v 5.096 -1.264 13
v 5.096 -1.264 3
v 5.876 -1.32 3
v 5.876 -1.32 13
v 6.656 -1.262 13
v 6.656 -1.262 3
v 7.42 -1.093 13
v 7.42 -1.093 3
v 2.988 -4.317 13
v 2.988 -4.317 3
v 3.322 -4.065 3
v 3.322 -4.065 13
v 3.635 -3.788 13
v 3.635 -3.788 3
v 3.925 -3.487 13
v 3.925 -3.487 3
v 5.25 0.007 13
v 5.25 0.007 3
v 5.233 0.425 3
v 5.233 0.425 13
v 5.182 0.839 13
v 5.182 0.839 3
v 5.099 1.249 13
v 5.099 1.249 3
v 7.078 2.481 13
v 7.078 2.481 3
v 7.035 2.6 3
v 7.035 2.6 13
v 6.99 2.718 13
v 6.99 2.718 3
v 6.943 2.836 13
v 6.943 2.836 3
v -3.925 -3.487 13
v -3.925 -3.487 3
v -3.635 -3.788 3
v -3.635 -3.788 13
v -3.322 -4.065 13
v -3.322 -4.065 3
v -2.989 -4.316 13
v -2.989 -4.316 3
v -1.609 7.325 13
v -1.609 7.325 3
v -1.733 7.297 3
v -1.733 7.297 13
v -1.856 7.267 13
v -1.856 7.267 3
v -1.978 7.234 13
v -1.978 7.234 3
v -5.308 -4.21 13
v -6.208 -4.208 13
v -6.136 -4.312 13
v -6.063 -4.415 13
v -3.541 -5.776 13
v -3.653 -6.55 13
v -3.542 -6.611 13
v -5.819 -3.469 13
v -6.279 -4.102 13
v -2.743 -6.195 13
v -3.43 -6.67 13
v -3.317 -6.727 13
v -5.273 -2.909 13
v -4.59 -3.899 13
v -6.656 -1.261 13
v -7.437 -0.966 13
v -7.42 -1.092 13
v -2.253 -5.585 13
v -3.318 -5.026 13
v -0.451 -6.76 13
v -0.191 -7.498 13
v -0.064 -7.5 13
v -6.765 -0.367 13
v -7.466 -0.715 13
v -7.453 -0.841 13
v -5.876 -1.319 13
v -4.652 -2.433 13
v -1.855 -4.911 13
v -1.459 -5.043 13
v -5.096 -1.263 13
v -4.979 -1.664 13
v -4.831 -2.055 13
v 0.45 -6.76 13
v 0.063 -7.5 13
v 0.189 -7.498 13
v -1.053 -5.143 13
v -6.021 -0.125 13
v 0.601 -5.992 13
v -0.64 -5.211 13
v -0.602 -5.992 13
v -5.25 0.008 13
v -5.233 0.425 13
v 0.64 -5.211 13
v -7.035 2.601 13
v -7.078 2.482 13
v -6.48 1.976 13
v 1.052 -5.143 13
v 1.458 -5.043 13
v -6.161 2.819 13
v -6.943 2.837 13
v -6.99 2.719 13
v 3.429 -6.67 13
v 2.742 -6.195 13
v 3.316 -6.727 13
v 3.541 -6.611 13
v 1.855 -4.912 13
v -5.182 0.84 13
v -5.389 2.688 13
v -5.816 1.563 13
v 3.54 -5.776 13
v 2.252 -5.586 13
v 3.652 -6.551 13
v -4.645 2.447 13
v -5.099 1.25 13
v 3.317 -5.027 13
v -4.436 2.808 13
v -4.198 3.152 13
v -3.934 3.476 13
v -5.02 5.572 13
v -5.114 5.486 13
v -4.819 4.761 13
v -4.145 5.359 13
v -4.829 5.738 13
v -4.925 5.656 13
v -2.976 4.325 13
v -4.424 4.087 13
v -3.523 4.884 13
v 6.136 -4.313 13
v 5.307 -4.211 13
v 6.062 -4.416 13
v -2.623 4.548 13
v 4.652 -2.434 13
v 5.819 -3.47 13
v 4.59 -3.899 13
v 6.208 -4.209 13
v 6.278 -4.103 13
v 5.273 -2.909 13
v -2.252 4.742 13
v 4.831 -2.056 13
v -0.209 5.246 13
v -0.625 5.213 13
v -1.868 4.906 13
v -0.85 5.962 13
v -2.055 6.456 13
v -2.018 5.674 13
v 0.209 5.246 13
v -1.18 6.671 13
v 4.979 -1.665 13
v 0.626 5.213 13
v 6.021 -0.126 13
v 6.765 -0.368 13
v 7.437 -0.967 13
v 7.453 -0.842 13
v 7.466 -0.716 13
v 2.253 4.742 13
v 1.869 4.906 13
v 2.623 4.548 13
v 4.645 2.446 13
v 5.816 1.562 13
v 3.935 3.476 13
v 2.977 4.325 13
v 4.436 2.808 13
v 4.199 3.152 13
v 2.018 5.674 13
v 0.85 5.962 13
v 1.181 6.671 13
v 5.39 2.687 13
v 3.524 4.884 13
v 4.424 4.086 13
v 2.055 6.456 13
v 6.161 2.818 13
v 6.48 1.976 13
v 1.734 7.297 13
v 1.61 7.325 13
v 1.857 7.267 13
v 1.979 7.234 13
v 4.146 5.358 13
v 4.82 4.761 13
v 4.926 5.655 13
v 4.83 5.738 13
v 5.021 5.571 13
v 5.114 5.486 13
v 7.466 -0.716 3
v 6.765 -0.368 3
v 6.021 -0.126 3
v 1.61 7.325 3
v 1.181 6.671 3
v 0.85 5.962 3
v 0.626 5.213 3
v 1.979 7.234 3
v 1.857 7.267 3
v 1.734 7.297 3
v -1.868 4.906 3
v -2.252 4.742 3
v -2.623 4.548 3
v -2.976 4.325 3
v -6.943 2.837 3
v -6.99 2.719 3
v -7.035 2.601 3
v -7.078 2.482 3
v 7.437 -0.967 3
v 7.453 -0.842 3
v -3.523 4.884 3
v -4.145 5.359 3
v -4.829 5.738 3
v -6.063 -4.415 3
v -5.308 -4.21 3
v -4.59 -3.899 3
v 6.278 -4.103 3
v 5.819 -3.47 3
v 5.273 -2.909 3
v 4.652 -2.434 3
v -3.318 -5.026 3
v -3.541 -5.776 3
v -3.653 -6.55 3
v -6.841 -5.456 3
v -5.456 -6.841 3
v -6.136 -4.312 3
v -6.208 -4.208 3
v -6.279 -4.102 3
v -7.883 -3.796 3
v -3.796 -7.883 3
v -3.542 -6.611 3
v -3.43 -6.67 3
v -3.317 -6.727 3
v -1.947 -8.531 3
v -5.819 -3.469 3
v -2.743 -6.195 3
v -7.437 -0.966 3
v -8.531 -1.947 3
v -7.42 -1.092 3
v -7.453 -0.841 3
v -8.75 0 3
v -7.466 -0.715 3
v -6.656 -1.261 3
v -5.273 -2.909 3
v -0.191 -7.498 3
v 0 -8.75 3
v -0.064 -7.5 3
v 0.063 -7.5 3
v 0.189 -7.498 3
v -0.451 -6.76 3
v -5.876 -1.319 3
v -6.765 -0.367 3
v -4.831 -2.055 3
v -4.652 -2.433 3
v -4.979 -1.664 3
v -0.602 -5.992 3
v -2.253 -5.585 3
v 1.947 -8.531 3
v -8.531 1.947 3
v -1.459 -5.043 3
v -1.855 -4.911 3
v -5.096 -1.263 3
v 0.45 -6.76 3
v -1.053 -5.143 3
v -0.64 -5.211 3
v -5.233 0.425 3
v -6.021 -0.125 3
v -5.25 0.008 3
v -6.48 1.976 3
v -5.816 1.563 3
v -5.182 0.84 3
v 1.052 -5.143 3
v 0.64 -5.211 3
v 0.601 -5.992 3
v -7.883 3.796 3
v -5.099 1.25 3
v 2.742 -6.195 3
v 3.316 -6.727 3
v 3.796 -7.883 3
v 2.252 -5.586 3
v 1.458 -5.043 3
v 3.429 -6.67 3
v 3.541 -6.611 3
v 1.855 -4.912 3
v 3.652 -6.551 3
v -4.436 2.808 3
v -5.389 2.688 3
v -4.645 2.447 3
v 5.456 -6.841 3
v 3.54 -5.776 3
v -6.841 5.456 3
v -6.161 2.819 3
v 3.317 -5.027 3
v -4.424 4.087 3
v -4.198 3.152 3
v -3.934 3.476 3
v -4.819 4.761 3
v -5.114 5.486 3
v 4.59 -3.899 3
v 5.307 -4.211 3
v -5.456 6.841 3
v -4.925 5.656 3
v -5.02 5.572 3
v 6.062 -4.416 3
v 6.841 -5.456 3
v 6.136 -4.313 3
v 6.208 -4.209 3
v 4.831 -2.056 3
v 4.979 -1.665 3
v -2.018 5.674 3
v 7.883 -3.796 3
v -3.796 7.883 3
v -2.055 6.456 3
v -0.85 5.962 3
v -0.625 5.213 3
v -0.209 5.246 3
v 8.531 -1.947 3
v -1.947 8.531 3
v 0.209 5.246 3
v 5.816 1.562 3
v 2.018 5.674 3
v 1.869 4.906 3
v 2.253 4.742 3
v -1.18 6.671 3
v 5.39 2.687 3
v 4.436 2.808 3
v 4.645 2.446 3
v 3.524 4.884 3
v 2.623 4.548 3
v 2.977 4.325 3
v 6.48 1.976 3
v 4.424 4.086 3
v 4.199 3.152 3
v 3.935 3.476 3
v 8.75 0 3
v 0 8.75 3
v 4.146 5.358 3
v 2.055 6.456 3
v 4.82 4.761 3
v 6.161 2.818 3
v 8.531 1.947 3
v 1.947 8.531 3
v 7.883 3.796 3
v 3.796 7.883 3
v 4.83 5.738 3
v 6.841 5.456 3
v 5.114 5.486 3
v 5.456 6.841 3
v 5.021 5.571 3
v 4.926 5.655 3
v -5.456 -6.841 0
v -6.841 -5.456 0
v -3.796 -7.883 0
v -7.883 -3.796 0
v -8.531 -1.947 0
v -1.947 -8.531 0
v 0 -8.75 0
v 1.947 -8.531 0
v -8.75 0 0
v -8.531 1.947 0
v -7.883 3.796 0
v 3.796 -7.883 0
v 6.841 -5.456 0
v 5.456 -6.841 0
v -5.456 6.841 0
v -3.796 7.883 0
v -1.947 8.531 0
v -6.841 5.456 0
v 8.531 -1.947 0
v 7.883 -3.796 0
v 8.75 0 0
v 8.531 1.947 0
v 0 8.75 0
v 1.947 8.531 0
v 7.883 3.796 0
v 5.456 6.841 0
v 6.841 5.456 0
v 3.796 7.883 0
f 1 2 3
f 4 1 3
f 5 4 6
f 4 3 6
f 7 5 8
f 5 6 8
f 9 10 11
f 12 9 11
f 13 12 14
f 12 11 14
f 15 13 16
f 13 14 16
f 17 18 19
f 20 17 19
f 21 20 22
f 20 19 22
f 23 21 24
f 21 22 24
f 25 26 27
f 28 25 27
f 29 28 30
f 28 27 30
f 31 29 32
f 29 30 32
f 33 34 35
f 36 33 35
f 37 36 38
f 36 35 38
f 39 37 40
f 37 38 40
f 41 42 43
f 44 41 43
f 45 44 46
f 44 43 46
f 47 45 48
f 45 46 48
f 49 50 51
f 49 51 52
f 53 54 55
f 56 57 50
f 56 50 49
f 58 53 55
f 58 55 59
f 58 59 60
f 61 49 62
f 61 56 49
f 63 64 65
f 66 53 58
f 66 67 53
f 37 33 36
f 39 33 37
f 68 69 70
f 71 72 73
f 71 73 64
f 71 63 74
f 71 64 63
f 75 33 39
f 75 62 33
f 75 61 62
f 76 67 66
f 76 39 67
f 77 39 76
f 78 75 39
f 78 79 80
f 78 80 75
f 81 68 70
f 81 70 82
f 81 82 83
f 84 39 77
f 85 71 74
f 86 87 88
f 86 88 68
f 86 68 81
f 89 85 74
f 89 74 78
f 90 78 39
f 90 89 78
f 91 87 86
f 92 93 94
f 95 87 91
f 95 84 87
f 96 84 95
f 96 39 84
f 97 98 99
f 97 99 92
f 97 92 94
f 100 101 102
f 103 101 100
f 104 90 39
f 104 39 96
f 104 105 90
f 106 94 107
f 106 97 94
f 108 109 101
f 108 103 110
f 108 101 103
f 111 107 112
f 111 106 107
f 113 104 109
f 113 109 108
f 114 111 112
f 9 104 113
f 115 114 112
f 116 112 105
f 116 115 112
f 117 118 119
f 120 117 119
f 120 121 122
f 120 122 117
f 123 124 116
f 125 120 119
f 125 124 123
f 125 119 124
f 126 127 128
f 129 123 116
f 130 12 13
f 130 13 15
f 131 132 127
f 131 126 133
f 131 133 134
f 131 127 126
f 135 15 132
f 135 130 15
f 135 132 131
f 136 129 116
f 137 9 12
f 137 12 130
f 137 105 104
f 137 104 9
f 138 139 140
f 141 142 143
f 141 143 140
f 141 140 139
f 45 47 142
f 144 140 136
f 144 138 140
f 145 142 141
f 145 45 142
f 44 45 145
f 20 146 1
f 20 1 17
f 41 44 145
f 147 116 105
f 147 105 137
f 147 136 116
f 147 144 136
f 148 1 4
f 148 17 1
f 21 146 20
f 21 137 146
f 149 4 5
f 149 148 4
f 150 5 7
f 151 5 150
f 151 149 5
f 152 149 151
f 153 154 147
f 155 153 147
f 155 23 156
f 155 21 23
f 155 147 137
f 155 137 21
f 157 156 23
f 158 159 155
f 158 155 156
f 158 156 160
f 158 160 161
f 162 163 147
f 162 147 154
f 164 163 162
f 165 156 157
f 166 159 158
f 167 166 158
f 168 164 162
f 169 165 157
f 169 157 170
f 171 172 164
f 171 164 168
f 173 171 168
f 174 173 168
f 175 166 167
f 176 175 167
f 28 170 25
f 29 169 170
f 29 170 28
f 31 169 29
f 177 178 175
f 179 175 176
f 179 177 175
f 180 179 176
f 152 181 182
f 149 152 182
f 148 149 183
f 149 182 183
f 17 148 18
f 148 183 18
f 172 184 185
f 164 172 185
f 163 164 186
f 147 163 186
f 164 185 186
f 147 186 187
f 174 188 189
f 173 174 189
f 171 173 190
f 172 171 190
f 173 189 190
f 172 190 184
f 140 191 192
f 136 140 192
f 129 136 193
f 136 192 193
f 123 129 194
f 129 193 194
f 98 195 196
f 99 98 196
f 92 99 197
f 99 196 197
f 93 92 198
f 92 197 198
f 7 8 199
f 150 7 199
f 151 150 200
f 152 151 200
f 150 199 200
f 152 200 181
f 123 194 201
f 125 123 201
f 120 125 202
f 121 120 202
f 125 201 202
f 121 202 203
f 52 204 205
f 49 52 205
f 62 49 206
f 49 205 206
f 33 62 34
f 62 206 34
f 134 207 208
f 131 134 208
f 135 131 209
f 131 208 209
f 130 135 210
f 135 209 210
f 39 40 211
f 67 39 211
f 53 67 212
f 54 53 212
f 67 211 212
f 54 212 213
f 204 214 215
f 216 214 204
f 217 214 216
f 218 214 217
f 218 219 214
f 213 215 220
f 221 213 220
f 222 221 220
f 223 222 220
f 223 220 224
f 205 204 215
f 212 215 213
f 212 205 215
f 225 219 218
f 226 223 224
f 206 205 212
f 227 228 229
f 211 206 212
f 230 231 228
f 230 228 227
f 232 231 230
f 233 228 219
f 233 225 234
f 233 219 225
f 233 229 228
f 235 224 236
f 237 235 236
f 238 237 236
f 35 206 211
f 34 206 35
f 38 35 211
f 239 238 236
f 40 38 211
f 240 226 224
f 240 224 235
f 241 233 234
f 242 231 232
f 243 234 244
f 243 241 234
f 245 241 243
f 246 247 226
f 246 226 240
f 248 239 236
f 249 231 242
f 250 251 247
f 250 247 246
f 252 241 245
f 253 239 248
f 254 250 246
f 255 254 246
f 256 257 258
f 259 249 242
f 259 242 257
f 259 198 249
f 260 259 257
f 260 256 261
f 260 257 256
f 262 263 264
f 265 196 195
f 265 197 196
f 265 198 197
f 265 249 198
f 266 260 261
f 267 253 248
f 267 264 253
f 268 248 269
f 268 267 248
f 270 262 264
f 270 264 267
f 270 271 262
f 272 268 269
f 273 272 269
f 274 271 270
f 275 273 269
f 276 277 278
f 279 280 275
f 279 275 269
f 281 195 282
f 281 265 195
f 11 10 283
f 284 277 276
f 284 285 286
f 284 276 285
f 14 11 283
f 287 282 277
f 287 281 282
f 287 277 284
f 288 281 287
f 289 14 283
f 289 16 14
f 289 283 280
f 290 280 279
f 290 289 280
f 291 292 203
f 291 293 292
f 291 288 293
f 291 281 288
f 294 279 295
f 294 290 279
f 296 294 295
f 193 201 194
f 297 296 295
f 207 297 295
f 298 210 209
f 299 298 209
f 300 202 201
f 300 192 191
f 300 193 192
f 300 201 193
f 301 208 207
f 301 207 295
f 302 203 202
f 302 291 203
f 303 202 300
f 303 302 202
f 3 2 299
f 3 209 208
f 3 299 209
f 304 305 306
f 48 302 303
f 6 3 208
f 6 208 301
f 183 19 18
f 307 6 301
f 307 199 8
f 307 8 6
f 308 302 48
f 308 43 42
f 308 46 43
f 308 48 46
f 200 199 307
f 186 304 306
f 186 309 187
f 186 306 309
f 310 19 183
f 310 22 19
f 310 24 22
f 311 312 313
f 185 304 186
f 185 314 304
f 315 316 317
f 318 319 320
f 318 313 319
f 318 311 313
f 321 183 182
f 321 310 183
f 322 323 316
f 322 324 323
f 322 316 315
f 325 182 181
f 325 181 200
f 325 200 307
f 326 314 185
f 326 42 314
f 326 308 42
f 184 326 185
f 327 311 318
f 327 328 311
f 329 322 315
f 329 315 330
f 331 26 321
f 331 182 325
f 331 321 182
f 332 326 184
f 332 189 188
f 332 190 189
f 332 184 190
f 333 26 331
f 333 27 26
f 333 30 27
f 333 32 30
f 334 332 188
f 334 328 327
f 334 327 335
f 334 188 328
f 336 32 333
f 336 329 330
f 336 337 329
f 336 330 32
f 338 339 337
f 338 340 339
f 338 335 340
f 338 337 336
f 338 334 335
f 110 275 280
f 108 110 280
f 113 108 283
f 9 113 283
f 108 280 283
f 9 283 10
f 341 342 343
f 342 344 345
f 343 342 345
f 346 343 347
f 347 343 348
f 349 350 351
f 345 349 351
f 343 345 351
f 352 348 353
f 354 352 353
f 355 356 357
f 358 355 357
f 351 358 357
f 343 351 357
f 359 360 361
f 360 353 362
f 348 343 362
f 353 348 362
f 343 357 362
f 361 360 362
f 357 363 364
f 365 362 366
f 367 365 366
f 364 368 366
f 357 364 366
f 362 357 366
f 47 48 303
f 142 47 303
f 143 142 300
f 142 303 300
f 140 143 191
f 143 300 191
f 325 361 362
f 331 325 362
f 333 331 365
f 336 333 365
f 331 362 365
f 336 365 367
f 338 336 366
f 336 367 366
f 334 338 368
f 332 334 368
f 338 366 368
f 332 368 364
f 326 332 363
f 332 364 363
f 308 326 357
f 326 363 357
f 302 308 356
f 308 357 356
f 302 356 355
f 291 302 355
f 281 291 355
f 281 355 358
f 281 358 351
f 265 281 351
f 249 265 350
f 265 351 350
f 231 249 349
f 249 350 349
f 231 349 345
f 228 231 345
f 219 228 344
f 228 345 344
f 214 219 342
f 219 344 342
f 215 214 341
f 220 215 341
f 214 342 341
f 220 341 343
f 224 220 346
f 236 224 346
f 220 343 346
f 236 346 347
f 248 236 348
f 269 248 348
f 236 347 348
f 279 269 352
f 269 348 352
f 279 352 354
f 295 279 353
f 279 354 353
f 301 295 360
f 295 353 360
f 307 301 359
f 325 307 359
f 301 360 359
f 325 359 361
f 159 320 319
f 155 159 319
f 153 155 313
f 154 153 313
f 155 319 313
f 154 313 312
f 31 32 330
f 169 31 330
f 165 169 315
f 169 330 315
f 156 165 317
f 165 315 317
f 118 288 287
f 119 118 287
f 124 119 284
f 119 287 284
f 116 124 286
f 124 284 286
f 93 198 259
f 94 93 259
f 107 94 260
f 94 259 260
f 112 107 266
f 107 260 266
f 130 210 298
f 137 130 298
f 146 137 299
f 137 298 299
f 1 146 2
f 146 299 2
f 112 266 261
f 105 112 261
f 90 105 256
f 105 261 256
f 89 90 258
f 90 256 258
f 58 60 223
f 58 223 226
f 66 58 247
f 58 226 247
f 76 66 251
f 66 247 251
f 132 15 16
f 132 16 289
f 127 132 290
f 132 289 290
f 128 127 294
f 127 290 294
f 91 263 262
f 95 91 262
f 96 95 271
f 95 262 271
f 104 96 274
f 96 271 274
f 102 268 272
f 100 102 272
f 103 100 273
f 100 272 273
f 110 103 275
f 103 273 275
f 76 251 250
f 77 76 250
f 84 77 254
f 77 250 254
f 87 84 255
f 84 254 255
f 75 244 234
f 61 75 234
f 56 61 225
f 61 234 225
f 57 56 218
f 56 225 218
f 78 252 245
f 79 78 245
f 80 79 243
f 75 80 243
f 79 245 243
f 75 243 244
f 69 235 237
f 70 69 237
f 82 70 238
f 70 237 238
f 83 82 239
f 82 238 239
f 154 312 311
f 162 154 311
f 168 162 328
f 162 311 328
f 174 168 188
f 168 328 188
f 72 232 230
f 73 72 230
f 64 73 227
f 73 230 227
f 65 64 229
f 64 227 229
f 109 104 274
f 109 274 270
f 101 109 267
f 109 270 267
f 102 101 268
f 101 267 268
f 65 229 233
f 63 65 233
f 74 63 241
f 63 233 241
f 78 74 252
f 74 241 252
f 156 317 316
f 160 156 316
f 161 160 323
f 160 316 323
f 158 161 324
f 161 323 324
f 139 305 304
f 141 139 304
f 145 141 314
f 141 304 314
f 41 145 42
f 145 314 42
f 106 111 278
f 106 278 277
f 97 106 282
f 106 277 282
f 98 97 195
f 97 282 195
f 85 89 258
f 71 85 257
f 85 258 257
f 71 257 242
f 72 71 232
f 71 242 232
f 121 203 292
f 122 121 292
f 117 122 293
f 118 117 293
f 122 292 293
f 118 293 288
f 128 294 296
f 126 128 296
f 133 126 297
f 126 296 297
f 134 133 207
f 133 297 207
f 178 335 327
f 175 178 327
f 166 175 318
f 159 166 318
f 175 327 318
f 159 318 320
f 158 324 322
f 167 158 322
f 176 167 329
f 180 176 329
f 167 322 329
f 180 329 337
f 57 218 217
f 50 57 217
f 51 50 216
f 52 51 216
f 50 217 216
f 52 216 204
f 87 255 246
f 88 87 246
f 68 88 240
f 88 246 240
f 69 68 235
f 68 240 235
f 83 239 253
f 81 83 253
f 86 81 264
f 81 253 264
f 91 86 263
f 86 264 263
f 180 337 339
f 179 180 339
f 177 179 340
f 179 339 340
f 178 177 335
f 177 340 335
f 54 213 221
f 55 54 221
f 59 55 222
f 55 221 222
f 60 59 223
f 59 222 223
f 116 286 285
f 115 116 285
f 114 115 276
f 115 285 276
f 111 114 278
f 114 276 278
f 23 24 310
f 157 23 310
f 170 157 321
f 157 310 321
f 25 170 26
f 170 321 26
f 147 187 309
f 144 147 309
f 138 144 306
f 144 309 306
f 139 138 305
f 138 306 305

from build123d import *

# Parameters (mm, degrees)
SKETCH1_R           = 8.75
BOSS_EXTRUDE1_DEPTH = 3
BOSS_EXTRUDE2_DEPTH = 10


with BuildPart() as part:
    # Sketch1 → Boss-Extrude1 (new body)
    with BuildSketch(Plane.XY):
        Circle(SKETCH1_R)
    extrude(amount=BOSS_EXTRUDE1_DEPTH)

    # Sketch2 → Boss-Extrude2 (add)
    with BuildSketch(Plane.XY.offset(3)):
        with BuildLine():
            ThreePointArc((4.829991895, 5.737697996), (3.826186326, 5.132311911), (2.976672459, 4.324571779))
            ThreePointArc((2.976672459, 4.324571779), (2.440108702, 4.648480345), (1.868768811, 4.906139331))
            ThreePointArc((1.868768811, 4.906139331), (2.051102492, 6.064099762), (1.979255999, 7.234123699))
            ThreePointArc((1.979255999, 7.234123699), (1.795356309, 7.281943128), (1.610304214, 7.325088418))
            ThreePointArc((1.610304214, 7.325088418), (1.002815466, 6.322553954), (0.62598385, 5.212546807))
            ThreePointArc((0.62598385, 5.212546807), (0.000352422, 5.249999988), (-0.625284028, 5.212630803))
            ThreePointArc((-0.625284028, 5.212630803), (-1.001966616, 6.322688531), (-1.609320762, 7.325304546))
            ThreePointArc((-1.609320762, 7.325304546), (-1.794378647, 7.2821841), (-1.978284756, 7.234389361))
            ThreePointArc((-1.978284756, 7.234389361), (-2.050288332, 6.06437508), (-1.868110115, 4.90639018))
            ThreePointArc((-1.868110115, 4.90639018), (-2.439484593, 4.648807903), (-2.976091832, 4.324971377))
            ThreePointArc((-2.976091832, 4.324971377), (-3.825497247, 5.132825554), (-4.82922153, 5.738346401))
            ThreePointArc((-4.82922153, 5.738346401), (-4.97304308, 5.614164455), (-5.113672529, 5.486378884))
            ThreePointArc((-5.113672529, 5.486378884), (-4.633695781, 4.41692096), (-3.934242565, 3.476238691))
            ThreePointArc((-3.934242565, 3.476238691), (-4.320465088, 2.982629951), (-4.645112863, 2.44651313))
            ThreePointArc((-4.645112863, 2.44651313), (-5.772652562, 2.7670941), (-6.942805845, 2.83680225))
            ThreePointArc((-6.942805845, 2.83680225), (-7.012443275, 2.66000739), (-7.077579552, 2.481505124))
            ThreePointArc((-7.077579552, 2.481505124), (-6.15557937, 1.757603477), (-5.099087457, 1.249722811))
            ThreePointArc((-5.099087457, 1.249722811), (-5.211679097, 0.633167423), (-5.249994516, 0.007588209))
            ThreePointArc((-5.249994516, 0.007588209), (-6.397362742, -0.232545265), (-7.46587701, -0.71461911))
            ThreePointArc((-7.46587701, -0.71461911), (-7.445377224, -0.90352531), (-7.420098394, -1.091851556))
            ThreePointArc((-7.420098394, -1.091851556), (-6.267293907, -1.304359781), (-5.095792863, -1.263089504))
            ThreePointArc((-5.095792863, -1.263089504), (-4.908960234, -1.861346132), (-4.652165695, -2.43307508))
            ThreePointArc((-4.652165695, -2.43307508), (-5.556514215, -3.178911313), (-6.278605726, -4.102329843))
            ThreePointArc((-6.278605726, -4.102329843), (-6.172664978, -4.260071251), (-6.062762116, -4.415078202))
            ThreePointArc((-6.062762116, -4.415078202), (-4.94324694, -4.067509932), (-3.925113535, -3.486543236))
            ThreePointArc((-3.925113535, -3.486543236), (-3.48165774, -3.92944772), (-2.988581778, -4.316350189))
            ThreePointArc((-2.988581778, -4.316350189), (-3.442735244, -5.397027088), (-3.652981535, -6.550246247))
            ThreePointArc((-3.652981535, -6.550246247), (-3.485869574, -6.640686208), (-3.316520101, -6.726863639))
            ThreePointArc((-3.316520101, -6.726863639), (-2.486761671, -5.898842577), (-1.855237999, -4.91127193))
            ThreePointArc((-1.855237999, -4.91127193), (-1.256749416, -5.09736019), (-0.640349792, -5.210801488))
            ThreePointArc((-0.640349792, -5.210801488), (-0.540267119, -6.378748999), (-0.190503298, -7.497580176))
            ThreePointArc((-0.190503298, -7.497580176), (-0.00050346, -7.499999983), (0.189496701, -7.497605685))
            ThreePointArc((0.189496701, -7.497605685), (0.539410728, -6.378821476), (0.639650205, -5.210887412))
            ThreePointArc((0.639650205, -5.210887412), (1.256065053, -5.09752887), (1.854578614, -4.911520962))
            ThreePointArc((1.854578614, -4.911520962), (2.485969693, -5.899176387), (3.315616949, -6.727308842))
            ThreePointArc((3.315616949, -6.727308842), (3.48497799, -6.641154147), (3.652102092, -6.550736623))
            ThreePointArc((3.652102092, -6.550736623), (3.44201063, -5.397489248), (2.988002255, -4.316751385))
            ThreePointArc((2.988002255, -4.316751385), (3.481130156, -3.929915118), (3.92464541, -3.487070175))
            ThreePointArc((3.92464541, -3.487070175), (4.942700807, -4.068173557), (6.06216931, -4.415892125))
            ThreePointArc((6.06216931, -4.415892125), (6.172092982, -4.260899931), (6.278054907, -4.103172747))
            ThreePointArc((6.278054907, -4.103172747), (5.556087377, -3.17965728), (4.651838998, -2.433699639))
            ThreePointArc((4.651838998, -2.433699639), (4.908710292, -1.862005173), (5.09562324, -1.263773634))
            ThreePointArc((5.09562324, -1.263773634), (6.267118732, -1.305201192), (7.41995174, -1.092847739))
            ThreePointArc((7.41995174, -1.092847739), (7.445255854, -0.904524889), (7.465781001, -0.715621443))
            ThreePointArc((7.465781001, -0.715621443), (6.397331464, -0.233404148), (5.249995488, 0.006883365))
            ThreePointArc((5.249995488, 0.006883365), (5.211764057, 0.632467717), (5.099255194, 1.249038216))
            ThreePointArc((5.099255194, 1.249038216), (6.155815283, 1.756777037), (7.077912646, 2.480554893))
            ThreePointArc((7.077912646, 2.480554893), (7.012800334, 2.659065903), (6.94318664, 2.83587011))
            ThreePointArc((6.94318664, 2.83587011), (5.773024009, 2.766319061), (4.64544128, 2.445889473))
            ThreePointArc((4.64544128, 2.445889473), (4.320865485, 2.982049876), (3.934709236, 3.475710464))
            ThreePointArc((3.934709236, 3.475710464), (4.634288738, 4.416298818), (5.114409063, 5.485692293))
            ThreePointArc((5.114409063, 5.485692293), (4.973796771, 5.613496743), (4.829991895, 5.737697996))
        make_face()
    extrude(amount=BOSS_EXTRUDE2_DEPTH)


solid = part.part
